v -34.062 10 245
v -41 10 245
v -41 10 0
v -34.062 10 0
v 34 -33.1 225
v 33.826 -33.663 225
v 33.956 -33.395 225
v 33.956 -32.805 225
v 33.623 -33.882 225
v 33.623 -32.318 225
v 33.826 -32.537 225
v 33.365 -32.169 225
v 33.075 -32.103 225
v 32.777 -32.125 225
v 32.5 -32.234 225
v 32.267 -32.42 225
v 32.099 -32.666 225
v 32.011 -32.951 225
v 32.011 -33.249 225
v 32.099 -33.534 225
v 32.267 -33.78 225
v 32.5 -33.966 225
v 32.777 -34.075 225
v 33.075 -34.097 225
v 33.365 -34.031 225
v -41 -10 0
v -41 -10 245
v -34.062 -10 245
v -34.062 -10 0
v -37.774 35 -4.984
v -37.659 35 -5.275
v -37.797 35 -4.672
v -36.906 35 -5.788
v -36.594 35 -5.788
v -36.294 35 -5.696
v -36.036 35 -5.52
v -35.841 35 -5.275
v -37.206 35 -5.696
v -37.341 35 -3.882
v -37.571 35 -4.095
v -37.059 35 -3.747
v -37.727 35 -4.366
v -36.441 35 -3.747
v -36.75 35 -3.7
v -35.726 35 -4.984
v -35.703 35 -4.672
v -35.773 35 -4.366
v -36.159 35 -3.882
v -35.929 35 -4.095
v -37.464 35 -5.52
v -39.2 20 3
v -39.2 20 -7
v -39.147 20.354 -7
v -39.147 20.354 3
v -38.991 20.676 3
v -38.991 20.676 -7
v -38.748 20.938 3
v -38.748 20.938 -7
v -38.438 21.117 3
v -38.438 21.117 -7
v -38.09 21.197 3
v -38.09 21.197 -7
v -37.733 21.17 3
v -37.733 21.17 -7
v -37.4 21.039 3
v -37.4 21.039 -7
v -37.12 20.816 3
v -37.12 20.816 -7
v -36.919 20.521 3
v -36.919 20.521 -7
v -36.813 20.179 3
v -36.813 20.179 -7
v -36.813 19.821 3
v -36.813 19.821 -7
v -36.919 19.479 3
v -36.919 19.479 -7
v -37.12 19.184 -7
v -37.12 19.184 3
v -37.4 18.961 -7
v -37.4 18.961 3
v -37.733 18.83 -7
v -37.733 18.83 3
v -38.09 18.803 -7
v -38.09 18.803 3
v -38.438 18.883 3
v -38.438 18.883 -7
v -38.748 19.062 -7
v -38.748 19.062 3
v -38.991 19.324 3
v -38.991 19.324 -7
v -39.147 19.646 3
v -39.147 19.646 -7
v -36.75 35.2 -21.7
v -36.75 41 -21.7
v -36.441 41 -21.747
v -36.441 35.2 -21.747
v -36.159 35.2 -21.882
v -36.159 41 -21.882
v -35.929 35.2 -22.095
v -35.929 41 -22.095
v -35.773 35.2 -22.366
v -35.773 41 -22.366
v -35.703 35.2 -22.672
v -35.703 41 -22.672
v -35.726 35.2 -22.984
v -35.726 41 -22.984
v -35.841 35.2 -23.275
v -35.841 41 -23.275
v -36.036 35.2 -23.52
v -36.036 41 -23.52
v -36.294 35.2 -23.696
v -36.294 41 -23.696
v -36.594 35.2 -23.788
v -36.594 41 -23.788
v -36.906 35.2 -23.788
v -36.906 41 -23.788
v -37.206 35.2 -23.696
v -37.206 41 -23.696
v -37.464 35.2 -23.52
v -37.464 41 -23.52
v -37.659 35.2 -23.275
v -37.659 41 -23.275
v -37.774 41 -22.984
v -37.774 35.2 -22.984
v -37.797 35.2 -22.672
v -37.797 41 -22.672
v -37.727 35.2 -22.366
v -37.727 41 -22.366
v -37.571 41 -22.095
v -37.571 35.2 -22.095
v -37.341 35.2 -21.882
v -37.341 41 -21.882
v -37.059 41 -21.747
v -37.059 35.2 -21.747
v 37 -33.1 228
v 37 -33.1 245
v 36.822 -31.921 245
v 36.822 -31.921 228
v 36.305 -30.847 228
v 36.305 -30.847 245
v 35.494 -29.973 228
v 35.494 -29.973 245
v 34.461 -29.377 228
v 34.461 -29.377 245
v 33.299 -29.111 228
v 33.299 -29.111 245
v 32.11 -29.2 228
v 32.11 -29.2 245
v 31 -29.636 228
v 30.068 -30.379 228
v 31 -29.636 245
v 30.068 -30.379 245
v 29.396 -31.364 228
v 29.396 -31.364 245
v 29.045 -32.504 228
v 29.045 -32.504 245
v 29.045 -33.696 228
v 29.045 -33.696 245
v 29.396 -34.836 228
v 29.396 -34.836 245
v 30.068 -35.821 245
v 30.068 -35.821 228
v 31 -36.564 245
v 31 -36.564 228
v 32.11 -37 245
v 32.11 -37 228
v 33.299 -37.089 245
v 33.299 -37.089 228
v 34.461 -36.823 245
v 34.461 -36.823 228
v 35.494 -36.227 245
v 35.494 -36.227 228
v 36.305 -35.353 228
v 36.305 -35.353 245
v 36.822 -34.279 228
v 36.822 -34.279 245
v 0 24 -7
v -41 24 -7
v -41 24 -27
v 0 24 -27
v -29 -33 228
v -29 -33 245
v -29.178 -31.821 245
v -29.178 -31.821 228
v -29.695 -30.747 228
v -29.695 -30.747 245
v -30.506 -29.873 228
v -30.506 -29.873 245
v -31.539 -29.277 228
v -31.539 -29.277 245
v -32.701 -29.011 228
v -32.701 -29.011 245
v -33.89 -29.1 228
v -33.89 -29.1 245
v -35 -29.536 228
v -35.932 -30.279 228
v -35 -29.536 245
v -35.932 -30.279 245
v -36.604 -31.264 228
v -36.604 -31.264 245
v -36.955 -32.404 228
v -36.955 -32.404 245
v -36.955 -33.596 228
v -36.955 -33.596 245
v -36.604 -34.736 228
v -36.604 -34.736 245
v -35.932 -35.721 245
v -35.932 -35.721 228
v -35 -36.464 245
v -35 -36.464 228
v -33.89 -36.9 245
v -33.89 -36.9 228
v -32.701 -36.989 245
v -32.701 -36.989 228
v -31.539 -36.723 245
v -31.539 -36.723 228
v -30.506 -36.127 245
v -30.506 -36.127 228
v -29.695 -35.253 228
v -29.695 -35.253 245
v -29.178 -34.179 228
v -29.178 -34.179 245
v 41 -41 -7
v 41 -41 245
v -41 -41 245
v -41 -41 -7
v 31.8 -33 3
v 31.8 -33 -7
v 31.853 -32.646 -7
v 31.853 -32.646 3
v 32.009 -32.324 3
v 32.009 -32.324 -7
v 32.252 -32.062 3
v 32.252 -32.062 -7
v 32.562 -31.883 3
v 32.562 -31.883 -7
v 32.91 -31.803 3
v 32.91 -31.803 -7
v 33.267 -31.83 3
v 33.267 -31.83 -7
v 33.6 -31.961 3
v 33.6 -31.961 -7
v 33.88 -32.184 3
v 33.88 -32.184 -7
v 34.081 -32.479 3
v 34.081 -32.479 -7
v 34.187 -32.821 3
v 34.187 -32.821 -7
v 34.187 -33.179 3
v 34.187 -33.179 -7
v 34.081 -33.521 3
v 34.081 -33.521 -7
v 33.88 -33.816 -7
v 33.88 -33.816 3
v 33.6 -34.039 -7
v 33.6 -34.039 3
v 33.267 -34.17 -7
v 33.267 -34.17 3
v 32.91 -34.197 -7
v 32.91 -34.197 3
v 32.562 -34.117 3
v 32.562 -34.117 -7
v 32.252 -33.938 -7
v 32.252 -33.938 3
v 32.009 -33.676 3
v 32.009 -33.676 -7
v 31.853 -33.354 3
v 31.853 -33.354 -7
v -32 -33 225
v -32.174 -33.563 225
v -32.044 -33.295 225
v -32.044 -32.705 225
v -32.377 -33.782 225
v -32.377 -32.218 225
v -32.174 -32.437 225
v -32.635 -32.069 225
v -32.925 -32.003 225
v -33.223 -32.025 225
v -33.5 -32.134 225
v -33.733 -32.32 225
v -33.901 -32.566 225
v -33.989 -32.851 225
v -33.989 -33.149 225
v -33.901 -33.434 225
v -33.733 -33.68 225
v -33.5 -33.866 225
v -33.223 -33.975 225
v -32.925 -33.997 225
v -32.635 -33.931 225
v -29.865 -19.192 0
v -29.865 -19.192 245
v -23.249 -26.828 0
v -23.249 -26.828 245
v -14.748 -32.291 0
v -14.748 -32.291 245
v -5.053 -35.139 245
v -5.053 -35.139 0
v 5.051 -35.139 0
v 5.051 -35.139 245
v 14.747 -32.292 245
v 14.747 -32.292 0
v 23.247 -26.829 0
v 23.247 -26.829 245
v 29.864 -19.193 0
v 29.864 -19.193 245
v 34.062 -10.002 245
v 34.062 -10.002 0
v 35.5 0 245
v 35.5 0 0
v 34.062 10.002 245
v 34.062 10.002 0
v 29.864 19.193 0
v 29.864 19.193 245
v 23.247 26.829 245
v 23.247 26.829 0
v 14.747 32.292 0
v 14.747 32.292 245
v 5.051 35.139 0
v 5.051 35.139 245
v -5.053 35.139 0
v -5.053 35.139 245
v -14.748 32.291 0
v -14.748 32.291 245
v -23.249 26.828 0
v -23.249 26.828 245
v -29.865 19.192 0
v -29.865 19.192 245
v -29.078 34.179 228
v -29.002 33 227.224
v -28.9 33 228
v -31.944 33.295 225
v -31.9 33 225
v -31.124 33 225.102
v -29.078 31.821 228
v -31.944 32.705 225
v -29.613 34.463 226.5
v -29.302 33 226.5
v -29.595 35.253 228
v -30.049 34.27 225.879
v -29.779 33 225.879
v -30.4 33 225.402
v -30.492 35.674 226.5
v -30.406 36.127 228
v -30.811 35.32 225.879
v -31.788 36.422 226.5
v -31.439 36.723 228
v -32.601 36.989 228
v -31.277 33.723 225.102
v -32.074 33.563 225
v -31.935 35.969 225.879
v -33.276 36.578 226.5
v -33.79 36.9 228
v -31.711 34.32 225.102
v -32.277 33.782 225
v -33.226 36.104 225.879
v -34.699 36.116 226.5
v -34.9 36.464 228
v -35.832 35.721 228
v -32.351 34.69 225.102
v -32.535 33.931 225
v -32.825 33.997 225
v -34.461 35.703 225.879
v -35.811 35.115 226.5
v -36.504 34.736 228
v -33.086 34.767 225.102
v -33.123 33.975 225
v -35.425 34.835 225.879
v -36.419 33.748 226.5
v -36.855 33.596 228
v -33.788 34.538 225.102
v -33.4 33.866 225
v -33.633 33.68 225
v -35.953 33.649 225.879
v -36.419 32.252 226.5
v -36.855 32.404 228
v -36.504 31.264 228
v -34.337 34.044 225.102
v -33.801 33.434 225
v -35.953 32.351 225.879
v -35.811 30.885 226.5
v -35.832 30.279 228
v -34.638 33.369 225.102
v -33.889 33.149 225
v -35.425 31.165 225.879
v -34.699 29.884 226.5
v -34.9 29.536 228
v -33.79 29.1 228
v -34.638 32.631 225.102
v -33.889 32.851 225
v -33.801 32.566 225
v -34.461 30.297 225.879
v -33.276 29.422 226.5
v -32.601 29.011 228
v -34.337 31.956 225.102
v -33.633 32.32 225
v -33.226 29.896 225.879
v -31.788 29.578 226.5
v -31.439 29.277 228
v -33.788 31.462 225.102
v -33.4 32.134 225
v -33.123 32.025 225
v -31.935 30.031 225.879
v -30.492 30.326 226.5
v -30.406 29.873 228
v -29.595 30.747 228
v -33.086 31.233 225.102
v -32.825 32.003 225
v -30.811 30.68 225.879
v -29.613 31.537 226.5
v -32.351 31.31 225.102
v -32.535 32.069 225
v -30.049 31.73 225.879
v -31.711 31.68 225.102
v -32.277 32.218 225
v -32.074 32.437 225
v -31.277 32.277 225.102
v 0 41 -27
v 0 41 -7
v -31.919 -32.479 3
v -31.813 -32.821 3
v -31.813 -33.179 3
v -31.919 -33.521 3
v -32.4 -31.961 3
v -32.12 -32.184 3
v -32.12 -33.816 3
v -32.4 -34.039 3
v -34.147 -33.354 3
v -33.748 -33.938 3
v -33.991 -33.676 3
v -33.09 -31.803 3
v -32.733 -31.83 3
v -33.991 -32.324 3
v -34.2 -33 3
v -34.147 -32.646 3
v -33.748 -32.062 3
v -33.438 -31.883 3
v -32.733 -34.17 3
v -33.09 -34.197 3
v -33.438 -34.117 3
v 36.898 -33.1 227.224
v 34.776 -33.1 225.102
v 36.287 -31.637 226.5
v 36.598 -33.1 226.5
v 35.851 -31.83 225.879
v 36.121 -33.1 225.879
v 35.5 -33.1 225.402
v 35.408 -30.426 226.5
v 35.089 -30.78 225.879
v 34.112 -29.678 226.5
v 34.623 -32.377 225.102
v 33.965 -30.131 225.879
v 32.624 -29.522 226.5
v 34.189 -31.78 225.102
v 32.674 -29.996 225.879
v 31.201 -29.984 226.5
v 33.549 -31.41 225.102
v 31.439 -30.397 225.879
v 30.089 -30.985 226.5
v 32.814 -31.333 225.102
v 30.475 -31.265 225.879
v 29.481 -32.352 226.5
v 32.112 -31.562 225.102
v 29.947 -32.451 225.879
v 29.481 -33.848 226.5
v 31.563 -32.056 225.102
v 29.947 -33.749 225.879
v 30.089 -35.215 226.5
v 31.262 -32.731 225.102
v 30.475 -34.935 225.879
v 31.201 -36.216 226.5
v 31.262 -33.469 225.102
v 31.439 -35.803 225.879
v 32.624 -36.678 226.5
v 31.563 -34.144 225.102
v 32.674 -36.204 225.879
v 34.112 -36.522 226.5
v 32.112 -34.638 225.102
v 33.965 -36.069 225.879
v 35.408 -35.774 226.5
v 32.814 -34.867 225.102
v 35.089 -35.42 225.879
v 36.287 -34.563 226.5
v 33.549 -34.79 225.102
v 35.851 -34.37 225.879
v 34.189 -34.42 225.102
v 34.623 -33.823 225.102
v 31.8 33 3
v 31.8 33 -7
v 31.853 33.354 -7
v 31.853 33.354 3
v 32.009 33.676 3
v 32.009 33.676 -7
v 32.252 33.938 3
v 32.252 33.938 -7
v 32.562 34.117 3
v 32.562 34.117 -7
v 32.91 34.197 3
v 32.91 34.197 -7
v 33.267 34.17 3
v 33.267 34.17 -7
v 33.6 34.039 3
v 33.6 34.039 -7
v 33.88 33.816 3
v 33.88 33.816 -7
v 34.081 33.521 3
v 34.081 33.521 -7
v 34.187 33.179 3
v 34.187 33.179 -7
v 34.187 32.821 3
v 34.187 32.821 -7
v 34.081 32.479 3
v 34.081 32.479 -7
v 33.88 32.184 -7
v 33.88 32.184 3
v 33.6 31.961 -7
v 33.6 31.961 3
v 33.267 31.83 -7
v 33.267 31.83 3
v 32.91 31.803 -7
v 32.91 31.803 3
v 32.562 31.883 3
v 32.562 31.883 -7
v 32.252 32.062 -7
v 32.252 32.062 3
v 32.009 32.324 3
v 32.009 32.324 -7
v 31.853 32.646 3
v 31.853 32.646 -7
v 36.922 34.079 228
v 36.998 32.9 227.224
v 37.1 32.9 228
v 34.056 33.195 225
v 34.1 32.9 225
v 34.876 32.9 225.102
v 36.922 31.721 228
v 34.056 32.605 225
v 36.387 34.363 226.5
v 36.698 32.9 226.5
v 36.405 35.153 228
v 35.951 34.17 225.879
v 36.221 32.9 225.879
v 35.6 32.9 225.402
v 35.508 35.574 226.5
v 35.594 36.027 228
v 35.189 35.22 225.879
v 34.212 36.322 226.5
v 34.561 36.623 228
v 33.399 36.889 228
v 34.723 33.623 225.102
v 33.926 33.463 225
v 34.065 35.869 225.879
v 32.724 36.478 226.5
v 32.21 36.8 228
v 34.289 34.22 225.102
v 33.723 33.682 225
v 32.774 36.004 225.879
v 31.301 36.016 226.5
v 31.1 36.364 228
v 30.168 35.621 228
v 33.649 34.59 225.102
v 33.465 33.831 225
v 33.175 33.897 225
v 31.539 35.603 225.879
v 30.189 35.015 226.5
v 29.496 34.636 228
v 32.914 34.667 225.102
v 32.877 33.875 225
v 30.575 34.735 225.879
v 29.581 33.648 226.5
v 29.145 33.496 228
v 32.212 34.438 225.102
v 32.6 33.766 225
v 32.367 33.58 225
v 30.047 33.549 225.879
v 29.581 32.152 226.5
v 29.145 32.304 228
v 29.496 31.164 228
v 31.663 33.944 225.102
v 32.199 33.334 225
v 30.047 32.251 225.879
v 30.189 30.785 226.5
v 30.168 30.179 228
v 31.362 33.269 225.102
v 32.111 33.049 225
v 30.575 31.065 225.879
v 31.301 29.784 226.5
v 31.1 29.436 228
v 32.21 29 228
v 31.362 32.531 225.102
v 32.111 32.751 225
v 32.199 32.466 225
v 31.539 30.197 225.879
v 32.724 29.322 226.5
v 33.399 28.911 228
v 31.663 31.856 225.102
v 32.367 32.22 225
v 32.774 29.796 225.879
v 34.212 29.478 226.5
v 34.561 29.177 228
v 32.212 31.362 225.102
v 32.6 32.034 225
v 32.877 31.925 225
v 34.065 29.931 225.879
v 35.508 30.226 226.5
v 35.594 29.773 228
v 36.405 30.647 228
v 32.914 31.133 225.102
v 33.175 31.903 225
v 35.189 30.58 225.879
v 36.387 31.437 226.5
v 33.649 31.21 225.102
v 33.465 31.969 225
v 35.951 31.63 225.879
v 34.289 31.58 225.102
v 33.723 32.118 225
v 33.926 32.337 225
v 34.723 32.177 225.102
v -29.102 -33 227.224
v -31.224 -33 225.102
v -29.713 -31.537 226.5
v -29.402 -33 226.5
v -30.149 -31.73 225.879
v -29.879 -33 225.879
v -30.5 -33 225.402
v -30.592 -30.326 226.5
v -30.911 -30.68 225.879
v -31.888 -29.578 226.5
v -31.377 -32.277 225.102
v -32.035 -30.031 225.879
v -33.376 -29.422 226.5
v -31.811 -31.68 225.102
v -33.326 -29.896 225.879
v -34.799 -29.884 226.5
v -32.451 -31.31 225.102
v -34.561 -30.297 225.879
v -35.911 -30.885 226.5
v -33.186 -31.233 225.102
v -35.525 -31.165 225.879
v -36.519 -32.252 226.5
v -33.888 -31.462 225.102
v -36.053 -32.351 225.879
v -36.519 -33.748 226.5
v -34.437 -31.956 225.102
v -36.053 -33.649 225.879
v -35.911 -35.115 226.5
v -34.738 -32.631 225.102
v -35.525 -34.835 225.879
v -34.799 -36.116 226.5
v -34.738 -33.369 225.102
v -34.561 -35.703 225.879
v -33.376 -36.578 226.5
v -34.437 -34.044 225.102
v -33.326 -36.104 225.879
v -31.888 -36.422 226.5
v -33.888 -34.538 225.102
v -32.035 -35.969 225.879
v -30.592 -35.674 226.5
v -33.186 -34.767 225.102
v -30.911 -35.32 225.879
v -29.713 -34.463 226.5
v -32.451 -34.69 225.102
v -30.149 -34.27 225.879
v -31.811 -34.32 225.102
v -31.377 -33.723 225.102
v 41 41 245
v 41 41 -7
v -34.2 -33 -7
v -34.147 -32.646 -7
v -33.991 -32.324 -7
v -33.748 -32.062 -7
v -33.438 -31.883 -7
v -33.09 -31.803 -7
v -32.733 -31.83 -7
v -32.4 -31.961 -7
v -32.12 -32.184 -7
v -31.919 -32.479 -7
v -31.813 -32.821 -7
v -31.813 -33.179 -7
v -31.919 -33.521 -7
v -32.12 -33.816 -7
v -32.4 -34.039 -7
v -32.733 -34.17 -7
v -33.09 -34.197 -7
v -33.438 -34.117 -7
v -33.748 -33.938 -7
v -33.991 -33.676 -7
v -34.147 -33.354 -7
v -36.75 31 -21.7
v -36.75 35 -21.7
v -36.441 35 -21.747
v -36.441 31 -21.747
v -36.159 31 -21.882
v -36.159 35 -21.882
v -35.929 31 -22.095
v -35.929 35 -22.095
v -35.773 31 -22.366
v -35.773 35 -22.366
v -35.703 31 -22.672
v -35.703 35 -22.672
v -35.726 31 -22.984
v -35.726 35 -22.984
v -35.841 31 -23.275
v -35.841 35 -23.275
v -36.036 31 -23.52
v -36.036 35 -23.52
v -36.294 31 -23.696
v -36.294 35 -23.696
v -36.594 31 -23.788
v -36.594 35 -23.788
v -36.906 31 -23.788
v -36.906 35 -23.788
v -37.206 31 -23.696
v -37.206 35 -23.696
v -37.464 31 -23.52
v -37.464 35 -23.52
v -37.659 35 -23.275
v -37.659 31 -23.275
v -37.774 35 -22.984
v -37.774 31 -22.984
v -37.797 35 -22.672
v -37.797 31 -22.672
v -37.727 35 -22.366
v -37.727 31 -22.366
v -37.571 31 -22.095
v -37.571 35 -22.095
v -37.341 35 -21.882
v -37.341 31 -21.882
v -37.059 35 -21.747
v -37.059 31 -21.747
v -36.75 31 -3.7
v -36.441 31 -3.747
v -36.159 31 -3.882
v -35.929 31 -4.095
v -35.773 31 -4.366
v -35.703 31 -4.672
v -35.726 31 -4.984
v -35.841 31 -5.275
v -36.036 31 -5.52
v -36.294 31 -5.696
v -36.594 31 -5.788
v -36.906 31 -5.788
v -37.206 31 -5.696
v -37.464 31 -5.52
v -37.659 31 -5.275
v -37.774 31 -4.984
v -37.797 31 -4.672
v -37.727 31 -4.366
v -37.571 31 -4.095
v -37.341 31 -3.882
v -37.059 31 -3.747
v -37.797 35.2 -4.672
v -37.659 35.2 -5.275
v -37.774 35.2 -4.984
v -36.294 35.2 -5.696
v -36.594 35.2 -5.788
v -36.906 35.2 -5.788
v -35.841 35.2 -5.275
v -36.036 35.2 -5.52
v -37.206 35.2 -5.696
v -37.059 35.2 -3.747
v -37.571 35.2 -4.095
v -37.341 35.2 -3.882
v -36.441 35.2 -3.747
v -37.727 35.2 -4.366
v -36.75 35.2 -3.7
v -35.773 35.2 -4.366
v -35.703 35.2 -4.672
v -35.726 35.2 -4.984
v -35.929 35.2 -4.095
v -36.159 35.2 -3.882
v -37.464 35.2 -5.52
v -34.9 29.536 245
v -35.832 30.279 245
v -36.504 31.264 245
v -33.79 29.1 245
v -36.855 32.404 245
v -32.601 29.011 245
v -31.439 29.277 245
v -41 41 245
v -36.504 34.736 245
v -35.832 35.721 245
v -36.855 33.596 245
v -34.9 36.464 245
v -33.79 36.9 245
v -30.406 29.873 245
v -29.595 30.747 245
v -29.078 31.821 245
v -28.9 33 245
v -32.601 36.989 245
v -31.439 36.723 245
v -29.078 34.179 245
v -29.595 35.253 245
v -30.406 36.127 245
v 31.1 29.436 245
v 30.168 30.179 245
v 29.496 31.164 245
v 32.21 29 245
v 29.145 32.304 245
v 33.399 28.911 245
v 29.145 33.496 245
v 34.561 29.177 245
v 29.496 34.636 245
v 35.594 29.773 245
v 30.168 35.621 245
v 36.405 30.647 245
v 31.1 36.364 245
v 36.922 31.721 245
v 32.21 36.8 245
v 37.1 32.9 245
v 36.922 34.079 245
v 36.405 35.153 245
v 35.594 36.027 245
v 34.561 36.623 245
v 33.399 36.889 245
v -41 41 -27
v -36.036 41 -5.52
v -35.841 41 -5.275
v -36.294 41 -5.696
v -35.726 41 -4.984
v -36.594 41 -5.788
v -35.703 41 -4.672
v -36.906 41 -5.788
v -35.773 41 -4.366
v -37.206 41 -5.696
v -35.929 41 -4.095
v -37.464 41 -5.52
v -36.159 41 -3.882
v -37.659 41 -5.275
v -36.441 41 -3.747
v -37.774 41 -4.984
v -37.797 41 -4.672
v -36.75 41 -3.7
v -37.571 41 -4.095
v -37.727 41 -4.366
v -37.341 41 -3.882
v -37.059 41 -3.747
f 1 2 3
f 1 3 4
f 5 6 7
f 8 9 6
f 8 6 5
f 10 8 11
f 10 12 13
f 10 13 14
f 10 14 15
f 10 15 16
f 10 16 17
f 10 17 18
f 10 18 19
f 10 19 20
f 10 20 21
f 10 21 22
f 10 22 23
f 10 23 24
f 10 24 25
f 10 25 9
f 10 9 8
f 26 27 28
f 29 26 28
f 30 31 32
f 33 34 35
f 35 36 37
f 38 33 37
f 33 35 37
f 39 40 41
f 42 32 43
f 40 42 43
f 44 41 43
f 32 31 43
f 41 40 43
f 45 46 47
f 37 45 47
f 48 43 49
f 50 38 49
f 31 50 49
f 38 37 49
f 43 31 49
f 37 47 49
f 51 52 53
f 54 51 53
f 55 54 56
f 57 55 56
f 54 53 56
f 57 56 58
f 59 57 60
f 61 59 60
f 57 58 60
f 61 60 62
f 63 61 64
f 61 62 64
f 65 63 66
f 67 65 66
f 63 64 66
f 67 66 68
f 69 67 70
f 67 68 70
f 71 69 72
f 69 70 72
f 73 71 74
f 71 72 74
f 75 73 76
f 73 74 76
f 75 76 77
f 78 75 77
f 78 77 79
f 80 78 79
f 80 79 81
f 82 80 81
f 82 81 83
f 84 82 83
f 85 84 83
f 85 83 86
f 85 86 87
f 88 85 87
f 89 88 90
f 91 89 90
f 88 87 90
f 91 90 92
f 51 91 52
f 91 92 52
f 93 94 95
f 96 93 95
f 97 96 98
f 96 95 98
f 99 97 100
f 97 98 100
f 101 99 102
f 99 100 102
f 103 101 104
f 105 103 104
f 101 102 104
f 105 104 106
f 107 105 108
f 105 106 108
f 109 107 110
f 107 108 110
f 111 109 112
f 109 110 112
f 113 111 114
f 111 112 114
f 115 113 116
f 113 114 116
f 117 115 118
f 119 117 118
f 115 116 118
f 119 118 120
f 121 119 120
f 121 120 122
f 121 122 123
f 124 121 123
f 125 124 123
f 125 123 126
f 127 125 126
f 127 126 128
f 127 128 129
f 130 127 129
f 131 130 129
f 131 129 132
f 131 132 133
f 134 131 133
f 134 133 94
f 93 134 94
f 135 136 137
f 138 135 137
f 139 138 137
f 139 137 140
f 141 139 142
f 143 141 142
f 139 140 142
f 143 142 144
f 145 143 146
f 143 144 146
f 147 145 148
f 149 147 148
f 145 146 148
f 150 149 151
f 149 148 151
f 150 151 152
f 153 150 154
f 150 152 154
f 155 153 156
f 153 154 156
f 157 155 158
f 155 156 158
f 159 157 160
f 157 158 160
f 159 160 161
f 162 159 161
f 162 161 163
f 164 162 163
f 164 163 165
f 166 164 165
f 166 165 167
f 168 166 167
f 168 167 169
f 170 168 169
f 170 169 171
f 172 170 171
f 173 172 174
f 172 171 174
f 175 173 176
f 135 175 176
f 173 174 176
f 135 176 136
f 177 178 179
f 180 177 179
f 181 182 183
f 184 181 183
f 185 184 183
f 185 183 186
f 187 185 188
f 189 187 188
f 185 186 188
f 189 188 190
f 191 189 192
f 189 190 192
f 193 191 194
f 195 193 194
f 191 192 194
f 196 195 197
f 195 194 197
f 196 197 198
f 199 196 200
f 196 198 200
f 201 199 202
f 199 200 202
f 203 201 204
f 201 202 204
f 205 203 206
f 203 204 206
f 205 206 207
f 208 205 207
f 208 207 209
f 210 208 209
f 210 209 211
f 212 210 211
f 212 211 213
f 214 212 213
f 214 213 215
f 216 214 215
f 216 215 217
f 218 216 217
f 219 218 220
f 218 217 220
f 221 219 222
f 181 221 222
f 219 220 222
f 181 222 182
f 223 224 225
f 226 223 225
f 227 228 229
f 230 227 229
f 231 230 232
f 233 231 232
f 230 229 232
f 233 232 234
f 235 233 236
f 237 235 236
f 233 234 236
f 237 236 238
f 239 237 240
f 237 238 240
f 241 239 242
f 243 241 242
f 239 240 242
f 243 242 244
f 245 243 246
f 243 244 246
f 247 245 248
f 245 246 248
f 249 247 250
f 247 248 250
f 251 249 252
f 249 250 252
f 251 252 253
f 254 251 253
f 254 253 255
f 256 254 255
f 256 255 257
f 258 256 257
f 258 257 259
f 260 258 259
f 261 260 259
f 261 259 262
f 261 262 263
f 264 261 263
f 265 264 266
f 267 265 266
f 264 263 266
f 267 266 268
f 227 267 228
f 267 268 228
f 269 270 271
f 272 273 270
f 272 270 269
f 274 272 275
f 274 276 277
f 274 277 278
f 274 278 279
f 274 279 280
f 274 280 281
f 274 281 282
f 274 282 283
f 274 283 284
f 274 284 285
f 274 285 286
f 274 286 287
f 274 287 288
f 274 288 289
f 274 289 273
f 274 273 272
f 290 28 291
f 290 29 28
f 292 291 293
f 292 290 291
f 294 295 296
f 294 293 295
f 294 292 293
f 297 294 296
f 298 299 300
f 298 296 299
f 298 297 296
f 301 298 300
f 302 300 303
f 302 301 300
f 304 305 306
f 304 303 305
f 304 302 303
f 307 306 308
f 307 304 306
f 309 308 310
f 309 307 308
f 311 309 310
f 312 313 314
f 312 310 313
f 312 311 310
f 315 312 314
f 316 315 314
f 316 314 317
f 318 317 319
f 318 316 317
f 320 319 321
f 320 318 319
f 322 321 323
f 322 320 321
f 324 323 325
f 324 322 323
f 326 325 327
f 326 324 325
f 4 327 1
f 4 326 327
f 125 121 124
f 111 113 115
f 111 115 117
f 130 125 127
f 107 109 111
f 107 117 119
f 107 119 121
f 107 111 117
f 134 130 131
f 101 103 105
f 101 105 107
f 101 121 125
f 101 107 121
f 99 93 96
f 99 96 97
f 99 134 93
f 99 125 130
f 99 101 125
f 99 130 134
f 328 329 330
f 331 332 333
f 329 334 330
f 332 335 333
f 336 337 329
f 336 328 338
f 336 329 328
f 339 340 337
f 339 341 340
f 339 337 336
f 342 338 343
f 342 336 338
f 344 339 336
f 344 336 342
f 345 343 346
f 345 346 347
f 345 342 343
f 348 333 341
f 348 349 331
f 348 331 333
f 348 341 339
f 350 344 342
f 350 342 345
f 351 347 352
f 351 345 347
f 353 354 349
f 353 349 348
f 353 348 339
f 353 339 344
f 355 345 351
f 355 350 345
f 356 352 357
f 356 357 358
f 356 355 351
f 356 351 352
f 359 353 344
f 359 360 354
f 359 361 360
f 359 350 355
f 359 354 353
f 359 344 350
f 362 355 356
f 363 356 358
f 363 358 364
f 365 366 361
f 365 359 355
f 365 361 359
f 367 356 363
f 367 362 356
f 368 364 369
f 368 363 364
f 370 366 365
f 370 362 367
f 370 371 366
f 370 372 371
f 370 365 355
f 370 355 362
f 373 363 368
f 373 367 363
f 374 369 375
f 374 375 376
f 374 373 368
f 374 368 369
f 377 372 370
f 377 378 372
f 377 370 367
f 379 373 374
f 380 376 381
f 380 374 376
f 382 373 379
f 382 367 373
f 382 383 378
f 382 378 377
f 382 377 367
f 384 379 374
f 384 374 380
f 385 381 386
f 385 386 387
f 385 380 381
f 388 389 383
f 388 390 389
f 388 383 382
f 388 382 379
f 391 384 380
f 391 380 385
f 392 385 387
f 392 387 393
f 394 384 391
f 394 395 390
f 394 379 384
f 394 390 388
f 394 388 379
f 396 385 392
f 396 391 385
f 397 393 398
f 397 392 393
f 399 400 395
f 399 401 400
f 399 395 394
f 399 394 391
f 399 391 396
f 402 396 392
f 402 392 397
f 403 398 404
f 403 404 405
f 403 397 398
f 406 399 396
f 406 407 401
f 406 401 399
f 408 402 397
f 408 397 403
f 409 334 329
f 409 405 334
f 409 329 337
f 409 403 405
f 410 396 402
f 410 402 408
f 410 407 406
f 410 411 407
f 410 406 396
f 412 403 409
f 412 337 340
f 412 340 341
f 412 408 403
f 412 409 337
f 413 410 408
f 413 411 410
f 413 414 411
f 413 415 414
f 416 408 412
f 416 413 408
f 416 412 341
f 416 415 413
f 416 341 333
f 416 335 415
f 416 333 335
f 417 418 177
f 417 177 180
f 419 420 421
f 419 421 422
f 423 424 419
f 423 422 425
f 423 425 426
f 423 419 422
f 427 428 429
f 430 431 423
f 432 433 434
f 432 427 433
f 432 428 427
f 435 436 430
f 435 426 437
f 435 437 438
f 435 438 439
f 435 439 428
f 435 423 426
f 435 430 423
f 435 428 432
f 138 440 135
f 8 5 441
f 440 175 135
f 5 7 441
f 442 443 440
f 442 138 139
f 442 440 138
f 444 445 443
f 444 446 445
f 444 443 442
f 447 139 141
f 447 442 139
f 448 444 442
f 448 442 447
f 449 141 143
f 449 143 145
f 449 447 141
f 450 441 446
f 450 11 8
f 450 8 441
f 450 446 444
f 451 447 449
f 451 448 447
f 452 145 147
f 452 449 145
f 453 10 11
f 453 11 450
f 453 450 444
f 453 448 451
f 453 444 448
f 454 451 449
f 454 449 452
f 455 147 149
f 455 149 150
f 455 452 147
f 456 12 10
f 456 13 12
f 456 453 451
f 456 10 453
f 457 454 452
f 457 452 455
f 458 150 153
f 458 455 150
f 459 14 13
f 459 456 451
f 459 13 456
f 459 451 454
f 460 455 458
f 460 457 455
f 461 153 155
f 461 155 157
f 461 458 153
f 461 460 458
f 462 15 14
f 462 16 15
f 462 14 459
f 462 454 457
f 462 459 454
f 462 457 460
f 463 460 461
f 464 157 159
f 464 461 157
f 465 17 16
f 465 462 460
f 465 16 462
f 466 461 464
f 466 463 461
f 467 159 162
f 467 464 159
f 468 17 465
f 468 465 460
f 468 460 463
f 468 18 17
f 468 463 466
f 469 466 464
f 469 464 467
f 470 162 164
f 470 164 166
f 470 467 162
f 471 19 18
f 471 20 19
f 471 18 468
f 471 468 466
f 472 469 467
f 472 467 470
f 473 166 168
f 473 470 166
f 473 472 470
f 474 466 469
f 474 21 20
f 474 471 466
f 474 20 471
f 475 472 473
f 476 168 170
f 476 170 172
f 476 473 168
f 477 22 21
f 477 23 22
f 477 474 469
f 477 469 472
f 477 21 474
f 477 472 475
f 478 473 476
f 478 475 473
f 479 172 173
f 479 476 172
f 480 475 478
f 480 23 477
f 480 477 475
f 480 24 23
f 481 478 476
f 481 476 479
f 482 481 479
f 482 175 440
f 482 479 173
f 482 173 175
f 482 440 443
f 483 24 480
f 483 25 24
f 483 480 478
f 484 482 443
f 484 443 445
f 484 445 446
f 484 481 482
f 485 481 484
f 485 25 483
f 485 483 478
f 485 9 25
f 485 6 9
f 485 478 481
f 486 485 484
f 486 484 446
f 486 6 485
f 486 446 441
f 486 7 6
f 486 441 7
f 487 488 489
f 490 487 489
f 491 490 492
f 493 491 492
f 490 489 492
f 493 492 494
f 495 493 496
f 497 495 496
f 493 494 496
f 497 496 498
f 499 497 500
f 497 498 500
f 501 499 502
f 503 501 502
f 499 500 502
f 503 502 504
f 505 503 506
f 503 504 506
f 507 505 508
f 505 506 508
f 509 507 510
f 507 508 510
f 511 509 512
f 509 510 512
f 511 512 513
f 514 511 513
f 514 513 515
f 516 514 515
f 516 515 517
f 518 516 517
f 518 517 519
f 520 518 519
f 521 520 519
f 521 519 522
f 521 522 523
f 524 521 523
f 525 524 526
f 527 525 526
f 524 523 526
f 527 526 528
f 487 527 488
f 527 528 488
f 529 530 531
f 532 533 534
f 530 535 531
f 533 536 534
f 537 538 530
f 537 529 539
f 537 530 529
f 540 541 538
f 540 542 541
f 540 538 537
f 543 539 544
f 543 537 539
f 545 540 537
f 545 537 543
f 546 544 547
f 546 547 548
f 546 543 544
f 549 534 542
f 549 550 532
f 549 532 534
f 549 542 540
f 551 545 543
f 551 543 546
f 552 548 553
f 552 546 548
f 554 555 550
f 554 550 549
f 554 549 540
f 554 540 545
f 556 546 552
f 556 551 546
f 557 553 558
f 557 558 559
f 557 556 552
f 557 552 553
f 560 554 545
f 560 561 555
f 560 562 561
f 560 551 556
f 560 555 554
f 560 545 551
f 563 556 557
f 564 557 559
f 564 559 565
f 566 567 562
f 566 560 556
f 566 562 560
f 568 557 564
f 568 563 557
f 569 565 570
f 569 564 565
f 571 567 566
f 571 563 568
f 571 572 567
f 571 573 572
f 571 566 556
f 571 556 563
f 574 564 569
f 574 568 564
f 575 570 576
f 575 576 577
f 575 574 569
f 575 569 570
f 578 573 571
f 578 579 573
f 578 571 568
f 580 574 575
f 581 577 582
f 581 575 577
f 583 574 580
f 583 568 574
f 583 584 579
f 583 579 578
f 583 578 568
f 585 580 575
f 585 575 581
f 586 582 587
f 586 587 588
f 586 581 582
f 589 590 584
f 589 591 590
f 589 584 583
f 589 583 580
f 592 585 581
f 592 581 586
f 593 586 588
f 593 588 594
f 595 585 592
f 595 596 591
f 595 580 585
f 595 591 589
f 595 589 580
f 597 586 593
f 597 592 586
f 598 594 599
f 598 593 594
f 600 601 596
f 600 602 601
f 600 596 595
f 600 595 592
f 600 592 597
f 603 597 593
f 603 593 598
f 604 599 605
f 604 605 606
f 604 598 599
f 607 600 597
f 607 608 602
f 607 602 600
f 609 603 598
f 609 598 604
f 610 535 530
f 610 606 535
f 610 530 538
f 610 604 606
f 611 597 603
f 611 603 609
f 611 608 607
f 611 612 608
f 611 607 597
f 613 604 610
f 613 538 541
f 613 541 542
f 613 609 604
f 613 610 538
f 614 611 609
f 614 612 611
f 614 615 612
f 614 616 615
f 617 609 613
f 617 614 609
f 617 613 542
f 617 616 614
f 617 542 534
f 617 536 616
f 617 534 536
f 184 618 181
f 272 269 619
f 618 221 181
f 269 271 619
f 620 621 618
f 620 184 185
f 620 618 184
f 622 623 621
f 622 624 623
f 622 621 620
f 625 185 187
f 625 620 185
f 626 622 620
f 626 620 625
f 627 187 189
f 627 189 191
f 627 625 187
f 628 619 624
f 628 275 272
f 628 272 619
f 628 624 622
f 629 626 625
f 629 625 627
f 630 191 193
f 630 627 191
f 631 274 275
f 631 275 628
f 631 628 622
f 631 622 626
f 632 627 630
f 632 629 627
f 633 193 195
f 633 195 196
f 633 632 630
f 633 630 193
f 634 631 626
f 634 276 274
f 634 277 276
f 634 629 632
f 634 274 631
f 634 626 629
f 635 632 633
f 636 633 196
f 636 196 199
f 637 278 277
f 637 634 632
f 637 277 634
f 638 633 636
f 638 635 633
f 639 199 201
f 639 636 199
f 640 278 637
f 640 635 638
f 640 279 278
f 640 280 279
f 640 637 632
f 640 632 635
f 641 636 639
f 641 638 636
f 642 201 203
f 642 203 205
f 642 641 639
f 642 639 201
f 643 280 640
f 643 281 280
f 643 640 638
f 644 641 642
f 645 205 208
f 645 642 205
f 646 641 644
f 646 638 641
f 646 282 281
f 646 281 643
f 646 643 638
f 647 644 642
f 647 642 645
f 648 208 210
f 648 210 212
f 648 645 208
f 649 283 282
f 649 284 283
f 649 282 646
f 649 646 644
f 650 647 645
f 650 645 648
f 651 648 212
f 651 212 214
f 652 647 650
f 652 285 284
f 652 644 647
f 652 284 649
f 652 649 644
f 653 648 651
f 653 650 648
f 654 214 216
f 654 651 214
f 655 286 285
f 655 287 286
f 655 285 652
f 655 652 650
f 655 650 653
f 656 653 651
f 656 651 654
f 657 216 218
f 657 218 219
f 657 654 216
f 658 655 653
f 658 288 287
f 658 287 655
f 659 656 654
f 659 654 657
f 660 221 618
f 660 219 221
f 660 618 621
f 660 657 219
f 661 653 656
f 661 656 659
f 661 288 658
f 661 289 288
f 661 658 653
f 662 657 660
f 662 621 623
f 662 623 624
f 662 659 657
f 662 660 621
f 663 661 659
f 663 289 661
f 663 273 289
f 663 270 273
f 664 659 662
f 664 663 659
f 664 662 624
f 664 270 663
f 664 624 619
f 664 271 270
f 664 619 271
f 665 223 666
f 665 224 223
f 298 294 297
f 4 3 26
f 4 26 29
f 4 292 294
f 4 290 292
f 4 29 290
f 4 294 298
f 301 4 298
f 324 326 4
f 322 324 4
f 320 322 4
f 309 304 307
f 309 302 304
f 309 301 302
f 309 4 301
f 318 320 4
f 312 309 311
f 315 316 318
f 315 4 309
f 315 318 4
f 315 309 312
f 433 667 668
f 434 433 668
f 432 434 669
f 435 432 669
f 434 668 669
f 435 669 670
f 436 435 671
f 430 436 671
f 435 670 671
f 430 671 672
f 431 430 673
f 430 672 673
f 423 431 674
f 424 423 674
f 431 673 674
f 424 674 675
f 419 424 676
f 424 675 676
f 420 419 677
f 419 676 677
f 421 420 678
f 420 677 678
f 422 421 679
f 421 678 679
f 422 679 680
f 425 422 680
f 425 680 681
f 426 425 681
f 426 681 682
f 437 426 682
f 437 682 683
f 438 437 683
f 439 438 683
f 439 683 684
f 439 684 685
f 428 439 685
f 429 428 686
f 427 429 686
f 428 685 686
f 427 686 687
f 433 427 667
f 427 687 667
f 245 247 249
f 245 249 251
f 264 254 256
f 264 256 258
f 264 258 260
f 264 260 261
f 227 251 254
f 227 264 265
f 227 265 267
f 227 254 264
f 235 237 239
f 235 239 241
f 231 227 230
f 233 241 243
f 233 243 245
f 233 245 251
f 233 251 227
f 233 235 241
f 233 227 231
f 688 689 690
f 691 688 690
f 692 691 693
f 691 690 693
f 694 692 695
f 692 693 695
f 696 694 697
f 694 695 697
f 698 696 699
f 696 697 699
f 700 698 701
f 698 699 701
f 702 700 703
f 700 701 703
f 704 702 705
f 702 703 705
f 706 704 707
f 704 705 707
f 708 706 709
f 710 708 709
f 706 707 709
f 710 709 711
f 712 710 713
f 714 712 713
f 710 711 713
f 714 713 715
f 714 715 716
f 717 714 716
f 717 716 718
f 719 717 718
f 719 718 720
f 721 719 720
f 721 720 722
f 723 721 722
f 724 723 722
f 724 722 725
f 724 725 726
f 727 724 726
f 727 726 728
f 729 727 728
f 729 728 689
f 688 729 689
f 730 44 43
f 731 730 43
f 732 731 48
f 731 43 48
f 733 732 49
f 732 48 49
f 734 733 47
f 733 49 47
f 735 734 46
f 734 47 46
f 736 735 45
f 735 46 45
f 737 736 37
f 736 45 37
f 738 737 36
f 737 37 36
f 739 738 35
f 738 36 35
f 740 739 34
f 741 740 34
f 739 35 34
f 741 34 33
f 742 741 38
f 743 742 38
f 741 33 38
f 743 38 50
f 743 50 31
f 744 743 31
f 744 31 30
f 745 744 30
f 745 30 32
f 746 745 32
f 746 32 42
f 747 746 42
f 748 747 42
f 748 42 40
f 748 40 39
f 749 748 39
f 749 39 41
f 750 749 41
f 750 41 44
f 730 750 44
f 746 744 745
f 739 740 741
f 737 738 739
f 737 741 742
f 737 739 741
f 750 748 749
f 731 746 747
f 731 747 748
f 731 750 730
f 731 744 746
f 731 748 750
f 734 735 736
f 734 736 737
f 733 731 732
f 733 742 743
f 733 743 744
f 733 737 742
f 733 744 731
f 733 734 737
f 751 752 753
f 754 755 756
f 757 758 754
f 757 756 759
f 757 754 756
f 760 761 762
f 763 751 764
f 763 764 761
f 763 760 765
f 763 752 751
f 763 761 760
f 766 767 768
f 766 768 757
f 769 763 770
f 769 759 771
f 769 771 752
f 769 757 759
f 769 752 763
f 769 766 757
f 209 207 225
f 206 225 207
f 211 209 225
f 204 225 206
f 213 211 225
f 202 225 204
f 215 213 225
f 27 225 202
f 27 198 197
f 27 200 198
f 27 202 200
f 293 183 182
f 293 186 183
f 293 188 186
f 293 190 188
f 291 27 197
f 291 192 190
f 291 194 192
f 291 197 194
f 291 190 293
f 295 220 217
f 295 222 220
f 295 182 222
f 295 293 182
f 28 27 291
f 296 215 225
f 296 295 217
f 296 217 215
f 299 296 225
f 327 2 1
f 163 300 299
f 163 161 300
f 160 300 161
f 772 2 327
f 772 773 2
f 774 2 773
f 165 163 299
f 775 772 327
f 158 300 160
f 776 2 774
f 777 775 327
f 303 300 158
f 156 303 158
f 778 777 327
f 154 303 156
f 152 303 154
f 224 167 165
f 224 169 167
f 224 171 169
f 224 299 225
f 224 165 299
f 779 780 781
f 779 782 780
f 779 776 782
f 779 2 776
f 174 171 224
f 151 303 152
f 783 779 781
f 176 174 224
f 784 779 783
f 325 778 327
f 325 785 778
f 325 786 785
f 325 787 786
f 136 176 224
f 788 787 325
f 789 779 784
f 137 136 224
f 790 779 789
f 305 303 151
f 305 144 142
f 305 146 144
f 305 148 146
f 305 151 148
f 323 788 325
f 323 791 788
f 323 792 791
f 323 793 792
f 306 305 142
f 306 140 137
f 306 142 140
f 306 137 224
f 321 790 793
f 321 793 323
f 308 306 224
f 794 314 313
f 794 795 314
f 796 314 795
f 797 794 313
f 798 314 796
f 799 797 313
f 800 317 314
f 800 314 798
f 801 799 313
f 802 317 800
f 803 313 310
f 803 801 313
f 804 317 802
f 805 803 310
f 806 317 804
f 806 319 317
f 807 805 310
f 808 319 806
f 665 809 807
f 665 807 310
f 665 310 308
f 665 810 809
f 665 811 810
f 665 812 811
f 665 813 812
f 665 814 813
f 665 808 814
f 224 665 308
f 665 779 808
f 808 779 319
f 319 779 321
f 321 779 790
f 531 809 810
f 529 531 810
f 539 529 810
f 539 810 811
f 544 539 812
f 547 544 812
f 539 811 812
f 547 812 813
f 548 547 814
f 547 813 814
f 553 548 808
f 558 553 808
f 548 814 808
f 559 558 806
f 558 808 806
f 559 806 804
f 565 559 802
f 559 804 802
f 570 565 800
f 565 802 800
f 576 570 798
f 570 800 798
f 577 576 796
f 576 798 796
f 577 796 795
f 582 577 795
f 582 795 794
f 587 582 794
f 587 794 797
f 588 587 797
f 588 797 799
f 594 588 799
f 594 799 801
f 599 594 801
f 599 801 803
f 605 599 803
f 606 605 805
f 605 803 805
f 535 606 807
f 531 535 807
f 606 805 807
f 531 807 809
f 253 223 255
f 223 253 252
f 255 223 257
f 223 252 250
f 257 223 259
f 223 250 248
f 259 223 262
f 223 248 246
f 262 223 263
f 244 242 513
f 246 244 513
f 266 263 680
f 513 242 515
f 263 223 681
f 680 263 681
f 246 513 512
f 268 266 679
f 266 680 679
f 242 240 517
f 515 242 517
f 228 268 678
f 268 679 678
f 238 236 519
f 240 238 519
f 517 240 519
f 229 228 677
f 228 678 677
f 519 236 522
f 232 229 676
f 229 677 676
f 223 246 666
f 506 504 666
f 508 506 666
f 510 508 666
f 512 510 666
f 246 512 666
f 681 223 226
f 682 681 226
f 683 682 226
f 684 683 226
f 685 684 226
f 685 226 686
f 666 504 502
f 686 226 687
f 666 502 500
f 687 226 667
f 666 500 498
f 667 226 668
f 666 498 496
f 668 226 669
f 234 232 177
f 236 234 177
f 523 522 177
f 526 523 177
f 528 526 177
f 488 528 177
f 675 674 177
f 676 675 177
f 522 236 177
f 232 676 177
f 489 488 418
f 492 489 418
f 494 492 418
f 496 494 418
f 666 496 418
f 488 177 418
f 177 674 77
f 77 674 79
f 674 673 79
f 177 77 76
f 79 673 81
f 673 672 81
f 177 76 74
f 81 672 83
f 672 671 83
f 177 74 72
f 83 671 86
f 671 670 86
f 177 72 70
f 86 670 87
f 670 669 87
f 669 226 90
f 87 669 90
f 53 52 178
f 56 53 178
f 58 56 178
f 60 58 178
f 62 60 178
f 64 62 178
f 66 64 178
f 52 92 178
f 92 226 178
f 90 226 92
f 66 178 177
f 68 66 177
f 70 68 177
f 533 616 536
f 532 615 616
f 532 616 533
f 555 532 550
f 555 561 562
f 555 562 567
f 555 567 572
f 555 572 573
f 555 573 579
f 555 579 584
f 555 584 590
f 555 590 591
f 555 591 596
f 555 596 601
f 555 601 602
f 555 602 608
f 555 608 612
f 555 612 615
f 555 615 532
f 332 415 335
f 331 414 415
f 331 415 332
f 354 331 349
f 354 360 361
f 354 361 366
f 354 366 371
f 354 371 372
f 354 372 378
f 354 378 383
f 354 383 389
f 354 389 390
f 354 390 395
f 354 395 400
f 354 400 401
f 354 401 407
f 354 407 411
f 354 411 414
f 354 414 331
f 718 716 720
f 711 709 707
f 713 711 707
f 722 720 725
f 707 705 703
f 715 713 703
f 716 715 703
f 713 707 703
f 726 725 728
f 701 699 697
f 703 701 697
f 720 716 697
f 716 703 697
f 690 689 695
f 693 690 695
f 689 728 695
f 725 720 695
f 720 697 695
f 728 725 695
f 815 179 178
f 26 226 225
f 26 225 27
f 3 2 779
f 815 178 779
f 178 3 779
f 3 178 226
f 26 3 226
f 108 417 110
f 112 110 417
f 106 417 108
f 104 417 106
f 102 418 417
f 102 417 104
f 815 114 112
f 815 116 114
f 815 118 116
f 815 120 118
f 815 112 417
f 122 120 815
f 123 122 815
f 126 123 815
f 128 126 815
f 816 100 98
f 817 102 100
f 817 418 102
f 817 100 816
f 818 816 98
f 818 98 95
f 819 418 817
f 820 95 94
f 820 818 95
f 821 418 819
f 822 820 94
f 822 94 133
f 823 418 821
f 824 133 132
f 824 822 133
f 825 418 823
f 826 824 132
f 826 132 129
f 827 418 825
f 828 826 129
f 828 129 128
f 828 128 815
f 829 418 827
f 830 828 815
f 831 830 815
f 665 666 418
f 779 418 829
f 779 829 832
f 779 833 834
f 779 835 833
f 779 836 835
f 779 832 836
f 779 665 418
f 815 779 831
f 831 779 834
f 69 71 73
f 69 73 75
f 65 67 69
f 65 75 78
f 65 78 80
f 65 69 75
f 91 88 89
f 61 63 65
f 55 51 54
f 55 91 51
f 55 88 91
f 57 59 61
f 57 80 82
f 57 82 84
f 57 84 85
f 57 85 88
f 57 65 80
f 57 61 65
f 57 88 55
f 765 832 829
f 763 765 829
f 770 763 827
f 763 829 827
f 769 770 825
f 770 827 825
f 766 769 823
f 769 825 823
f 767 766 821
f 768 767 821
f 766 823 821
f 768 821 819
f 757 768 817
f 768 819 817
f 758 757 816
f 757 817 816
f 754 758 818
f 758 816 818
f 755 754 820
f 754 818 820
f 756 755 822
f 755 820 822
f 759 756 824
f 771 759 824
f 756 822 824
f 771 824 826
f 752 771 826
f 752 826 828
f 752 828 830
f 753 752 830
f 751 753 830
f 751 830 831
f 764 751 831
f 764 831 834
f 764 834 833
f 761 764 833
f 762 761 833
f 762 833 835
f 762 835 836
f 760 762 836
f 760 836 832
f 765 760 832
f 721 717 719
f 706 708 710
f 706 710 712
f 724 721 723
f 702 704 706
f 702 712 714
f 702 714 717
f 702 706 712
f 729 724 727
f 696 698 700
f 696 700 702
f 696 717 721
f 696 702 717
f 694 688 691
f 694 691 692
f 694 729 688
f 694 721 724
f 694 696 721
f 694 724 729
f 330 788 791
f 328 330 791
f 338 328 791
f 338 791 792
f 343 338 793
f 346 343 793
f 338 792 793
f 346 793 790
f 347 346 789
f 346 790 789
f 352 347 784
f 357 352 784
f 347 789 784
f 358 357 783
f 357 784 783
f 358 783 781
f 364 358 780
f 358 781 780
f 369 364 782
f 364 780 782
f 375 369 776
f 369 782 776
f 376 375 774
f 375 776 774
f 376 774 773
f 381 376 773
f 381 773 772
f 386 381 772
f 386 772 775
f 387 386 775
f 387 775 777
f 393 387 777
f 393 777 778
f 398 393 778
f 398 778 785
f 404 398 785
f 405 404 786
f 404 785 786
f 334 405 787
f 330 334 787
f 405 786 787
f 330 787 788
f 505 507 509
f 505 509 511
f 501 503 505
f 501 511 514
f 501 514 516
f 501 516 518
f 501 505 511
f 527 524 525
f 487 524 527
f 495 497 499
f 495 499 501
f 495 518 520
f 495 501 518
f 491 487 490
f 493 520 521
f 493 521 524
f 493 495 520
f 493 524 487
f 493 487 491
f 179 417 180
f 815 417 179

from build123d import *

# Parameters (mm, degrees)
SKETCH_1_W          = 82
SKETCH_1_H          = 82
SKETCH_1_R          = 35.5
EXTRUDE_1_DEPTH     = 245
SKETCH_2_W          = 82
SKETCH_2_H          = 82
EXTRUDE_2_DEPTH     = 27
SKETCH_3_W          = 8
SKETCH_3_H          = 20
CUT_EXTRUDE_1_DEPTH = 245
SKETCH_4_R          = 4
CUT_EXTRUDE_2_DEPTH = 20
FILLET_2_R          = 3
FILLET_3_R          = 3
FILLET_4_R          = 3
FILLET_5_R          = 3
SKETCH_5_R          = 1.05
CUT_EXTRUDE_3_DEPTH = 10
EXTRUDE_START       = 0.2
SKETCH_6_R          = 1.05
EXTRUDE_3_DEPTH     = 0.2
CUT_EXTRUDE_5_REACH = 263.591
SKETCH_7_W          = 20
SKETCH_7_H          = 65
CUT_EXTRUDE_6_REACH = 263.591
SKETCH_8_W          = 41
SKETCH_8_H          = 20
SKETCH_9_R          = 1.2
CUT_EXTRUDE_7_DEPTH = 10


with BuildPart() as part:
    # 草圖1 → 填料-伸長1 (new body)
    with BuildSketch(Plane.XY):
        Rectangle(SKETCH_1_W, SKETCH_1_H)
        Circle(SKETCH_1_R, mode=Mode.SUBTRACT)
    extrude(amount=EXTRUDE_1_DEPTH)

    # 草圖2 → 填料-伸長2 (add)
    with BuildSketch(Plane(origin=(0, 0, 0), x_dir=(-1, 0, 0), z_dir=(0, 0, -1))):
        Rectangle(SKETCH_2_W, SKETCH_2_H)
    extrude(amount=EXTRUDE_2_DEPTH)

    # 草圖3 → 除料-伸長1 (cut)
    with BuildSketch(Plane.XY.offset(245)):
        with Locations((-37, 0)):
            Rectangle(SKETCH_3_W, SKETCH_3_H)
    extrude(amount=-CUT_EXTRUDE_1_DEPTH, mode=Mode.SUBTRACT)

    # 草圖4 → 除料-伸長2 (cut)
    with BuildSketch(Plane.XY.offset(245)):
        with Locations((-32.9, 33)):
            Circle(SKETCH_4_R)
        with Locations((33.1, 32.9)):
            Circle(SKETCH_4_R)
        with Locations((33, -33.1)):
            Circle(SKETCH_4_R)
        with Locations((-33, -33)):
            Circle(SKETCH_4_R)
    extrude(amount=-CUT_EXTRUDE_2_DEPTH, mode=Mode.SUBTRACT)

    # 圓角2
    fillet_2_edges = [part.edges().sort_by_distance(p)[0] for p in [
        (-36.9, 33, 225),
    ]]
    fillet(fillet_2_edges, radius=FILLET_2_R)

    # 圓角3
    fillet_3_edges = [part.edges().sort_by_distance(p)[0] for p in [
        (29.1, 32.9, 225),
    ]]
    fillet(fillet_3_edges, radius=FILLET_3_R)

    # 圓角4
    fillet_4_edges = [part.edges().sort_by_distance(p)[0] for p in [
        (-37, -33, 225),
    ]]
    fillet(fillet_4_edges, radius=FILLET_4_R)

    # 圓角5
    fillet_5_edges = [part.edges().sort_by_distance(p)[0] for p in [
        (29, -33.1, 225),
    ]]
    fillet(fillet_5_edges, radius=FILLET_5_R)

    # 草圖5 → 除料-伸長3 (cut)
    with BuildSketch(Plane(origin=(0, 41, 0), x_dir=(1, 0, 0), z_dir=(0, 1, 0))):
        with Locations(Location((-36.75, 22.75, 0), (0, 0, 270))):
            Circle(SKETCH_5_R)
        with Locations(Location((-36.75, 4.75, 0), (0, 0, 270))):
            Circle(SKETCH_5_R)
    extrude(amount=-CUT_EXTRUDE_3_DEPTH, mode=Mode.SUBTRACT)

    # 草圖6 → 填料-伸長3 (add)
    with BuildSketch(Plane(origin=(0, 35, 0), x_dir=(1, 0, 0), z_dir=(0, 1, 0)).offset(EXTRUDE_START)):
        with Locations(Location((-36.75, 22.75, 0), (0, 0, 270))):
            Circle(SKETCH_6_R)
        with Locations(Location((-36.75, 4.75, 0), (0, 0, 270))):
            Circle(SKETCH_6_R)
    extrude(amount=-EXTRUDE_3_DEPTH)

    # 草圖7 → 除料-伸長5 (cut, up to next)
    with BuildSketch(Plane(origin=(-41, 0, 0), x_dir=(0, 0, -1), z_dir=(1, 0, 0)), mode=Mode.PRIVATE) as cut_extrude_5_sk1:
        with Locations((17, -8.5)):
            Rectangle(SKETCH_7_W, SKETCH_7_H)
    cut_extrude_5_tool1 = extrude(cut_extrude_5_sk1.sketch, amount=CUT_EXTRUDE_5_REACH, mode=Mode.PRIVATE) & part.part
    add(cut_extrude_5_tool1.solids().sort_by_distance((-41, -8.5, -17))[0], mode=Mode.SUBTRACT)

    # 草圖8 → 除料-伸長6 (cut, up to next)
    with BuildSketch(Plane(origin=(0, 41, 0), x_dir=(1, 0, 0), z_dir=(0, 1, 0)), mode=Mode.PRIVATE) as cut_extrude_6_sk1:
        with Locations((20.5, 17)):
            Rectangle(SKETCH_8_W, SKETCH_8_H)
    cut_extrude_6_tool1 = extrude(cut_extrude_6_sk1.sketch, amount=-CUT_EXTRUDE_6_REACH, mode=Mode.PRIVATE) & part.part
    add(cut_extrude_6_tool1.solids().sort_by_distance((20.5, 41, -17))[0], mode=Mode.SUBTRACT)

    # 草圖9 → 除料-伸長7 (cut)
    with BuildSketch(Plane(origin=(0, 0, -7), x_dir=(-1, 0, 0), z_dir=(0, 0, -1))):
        with Locations((-33, 33)):
            Circle(SKETCH_9_R)
        with Locations((-33, -33)):
            Circle(SKETCH_9_R)
        with Locations((33, -33)):
            Circle(SKETCH_9_R)
        with Locations((38, 20)):
            Circle(SKETCH_9_R)
    extrude(amount=-CUT_EXTRUDE_7_DEPTH, mode=Mode.SUBTRACT)


solid = part.part
